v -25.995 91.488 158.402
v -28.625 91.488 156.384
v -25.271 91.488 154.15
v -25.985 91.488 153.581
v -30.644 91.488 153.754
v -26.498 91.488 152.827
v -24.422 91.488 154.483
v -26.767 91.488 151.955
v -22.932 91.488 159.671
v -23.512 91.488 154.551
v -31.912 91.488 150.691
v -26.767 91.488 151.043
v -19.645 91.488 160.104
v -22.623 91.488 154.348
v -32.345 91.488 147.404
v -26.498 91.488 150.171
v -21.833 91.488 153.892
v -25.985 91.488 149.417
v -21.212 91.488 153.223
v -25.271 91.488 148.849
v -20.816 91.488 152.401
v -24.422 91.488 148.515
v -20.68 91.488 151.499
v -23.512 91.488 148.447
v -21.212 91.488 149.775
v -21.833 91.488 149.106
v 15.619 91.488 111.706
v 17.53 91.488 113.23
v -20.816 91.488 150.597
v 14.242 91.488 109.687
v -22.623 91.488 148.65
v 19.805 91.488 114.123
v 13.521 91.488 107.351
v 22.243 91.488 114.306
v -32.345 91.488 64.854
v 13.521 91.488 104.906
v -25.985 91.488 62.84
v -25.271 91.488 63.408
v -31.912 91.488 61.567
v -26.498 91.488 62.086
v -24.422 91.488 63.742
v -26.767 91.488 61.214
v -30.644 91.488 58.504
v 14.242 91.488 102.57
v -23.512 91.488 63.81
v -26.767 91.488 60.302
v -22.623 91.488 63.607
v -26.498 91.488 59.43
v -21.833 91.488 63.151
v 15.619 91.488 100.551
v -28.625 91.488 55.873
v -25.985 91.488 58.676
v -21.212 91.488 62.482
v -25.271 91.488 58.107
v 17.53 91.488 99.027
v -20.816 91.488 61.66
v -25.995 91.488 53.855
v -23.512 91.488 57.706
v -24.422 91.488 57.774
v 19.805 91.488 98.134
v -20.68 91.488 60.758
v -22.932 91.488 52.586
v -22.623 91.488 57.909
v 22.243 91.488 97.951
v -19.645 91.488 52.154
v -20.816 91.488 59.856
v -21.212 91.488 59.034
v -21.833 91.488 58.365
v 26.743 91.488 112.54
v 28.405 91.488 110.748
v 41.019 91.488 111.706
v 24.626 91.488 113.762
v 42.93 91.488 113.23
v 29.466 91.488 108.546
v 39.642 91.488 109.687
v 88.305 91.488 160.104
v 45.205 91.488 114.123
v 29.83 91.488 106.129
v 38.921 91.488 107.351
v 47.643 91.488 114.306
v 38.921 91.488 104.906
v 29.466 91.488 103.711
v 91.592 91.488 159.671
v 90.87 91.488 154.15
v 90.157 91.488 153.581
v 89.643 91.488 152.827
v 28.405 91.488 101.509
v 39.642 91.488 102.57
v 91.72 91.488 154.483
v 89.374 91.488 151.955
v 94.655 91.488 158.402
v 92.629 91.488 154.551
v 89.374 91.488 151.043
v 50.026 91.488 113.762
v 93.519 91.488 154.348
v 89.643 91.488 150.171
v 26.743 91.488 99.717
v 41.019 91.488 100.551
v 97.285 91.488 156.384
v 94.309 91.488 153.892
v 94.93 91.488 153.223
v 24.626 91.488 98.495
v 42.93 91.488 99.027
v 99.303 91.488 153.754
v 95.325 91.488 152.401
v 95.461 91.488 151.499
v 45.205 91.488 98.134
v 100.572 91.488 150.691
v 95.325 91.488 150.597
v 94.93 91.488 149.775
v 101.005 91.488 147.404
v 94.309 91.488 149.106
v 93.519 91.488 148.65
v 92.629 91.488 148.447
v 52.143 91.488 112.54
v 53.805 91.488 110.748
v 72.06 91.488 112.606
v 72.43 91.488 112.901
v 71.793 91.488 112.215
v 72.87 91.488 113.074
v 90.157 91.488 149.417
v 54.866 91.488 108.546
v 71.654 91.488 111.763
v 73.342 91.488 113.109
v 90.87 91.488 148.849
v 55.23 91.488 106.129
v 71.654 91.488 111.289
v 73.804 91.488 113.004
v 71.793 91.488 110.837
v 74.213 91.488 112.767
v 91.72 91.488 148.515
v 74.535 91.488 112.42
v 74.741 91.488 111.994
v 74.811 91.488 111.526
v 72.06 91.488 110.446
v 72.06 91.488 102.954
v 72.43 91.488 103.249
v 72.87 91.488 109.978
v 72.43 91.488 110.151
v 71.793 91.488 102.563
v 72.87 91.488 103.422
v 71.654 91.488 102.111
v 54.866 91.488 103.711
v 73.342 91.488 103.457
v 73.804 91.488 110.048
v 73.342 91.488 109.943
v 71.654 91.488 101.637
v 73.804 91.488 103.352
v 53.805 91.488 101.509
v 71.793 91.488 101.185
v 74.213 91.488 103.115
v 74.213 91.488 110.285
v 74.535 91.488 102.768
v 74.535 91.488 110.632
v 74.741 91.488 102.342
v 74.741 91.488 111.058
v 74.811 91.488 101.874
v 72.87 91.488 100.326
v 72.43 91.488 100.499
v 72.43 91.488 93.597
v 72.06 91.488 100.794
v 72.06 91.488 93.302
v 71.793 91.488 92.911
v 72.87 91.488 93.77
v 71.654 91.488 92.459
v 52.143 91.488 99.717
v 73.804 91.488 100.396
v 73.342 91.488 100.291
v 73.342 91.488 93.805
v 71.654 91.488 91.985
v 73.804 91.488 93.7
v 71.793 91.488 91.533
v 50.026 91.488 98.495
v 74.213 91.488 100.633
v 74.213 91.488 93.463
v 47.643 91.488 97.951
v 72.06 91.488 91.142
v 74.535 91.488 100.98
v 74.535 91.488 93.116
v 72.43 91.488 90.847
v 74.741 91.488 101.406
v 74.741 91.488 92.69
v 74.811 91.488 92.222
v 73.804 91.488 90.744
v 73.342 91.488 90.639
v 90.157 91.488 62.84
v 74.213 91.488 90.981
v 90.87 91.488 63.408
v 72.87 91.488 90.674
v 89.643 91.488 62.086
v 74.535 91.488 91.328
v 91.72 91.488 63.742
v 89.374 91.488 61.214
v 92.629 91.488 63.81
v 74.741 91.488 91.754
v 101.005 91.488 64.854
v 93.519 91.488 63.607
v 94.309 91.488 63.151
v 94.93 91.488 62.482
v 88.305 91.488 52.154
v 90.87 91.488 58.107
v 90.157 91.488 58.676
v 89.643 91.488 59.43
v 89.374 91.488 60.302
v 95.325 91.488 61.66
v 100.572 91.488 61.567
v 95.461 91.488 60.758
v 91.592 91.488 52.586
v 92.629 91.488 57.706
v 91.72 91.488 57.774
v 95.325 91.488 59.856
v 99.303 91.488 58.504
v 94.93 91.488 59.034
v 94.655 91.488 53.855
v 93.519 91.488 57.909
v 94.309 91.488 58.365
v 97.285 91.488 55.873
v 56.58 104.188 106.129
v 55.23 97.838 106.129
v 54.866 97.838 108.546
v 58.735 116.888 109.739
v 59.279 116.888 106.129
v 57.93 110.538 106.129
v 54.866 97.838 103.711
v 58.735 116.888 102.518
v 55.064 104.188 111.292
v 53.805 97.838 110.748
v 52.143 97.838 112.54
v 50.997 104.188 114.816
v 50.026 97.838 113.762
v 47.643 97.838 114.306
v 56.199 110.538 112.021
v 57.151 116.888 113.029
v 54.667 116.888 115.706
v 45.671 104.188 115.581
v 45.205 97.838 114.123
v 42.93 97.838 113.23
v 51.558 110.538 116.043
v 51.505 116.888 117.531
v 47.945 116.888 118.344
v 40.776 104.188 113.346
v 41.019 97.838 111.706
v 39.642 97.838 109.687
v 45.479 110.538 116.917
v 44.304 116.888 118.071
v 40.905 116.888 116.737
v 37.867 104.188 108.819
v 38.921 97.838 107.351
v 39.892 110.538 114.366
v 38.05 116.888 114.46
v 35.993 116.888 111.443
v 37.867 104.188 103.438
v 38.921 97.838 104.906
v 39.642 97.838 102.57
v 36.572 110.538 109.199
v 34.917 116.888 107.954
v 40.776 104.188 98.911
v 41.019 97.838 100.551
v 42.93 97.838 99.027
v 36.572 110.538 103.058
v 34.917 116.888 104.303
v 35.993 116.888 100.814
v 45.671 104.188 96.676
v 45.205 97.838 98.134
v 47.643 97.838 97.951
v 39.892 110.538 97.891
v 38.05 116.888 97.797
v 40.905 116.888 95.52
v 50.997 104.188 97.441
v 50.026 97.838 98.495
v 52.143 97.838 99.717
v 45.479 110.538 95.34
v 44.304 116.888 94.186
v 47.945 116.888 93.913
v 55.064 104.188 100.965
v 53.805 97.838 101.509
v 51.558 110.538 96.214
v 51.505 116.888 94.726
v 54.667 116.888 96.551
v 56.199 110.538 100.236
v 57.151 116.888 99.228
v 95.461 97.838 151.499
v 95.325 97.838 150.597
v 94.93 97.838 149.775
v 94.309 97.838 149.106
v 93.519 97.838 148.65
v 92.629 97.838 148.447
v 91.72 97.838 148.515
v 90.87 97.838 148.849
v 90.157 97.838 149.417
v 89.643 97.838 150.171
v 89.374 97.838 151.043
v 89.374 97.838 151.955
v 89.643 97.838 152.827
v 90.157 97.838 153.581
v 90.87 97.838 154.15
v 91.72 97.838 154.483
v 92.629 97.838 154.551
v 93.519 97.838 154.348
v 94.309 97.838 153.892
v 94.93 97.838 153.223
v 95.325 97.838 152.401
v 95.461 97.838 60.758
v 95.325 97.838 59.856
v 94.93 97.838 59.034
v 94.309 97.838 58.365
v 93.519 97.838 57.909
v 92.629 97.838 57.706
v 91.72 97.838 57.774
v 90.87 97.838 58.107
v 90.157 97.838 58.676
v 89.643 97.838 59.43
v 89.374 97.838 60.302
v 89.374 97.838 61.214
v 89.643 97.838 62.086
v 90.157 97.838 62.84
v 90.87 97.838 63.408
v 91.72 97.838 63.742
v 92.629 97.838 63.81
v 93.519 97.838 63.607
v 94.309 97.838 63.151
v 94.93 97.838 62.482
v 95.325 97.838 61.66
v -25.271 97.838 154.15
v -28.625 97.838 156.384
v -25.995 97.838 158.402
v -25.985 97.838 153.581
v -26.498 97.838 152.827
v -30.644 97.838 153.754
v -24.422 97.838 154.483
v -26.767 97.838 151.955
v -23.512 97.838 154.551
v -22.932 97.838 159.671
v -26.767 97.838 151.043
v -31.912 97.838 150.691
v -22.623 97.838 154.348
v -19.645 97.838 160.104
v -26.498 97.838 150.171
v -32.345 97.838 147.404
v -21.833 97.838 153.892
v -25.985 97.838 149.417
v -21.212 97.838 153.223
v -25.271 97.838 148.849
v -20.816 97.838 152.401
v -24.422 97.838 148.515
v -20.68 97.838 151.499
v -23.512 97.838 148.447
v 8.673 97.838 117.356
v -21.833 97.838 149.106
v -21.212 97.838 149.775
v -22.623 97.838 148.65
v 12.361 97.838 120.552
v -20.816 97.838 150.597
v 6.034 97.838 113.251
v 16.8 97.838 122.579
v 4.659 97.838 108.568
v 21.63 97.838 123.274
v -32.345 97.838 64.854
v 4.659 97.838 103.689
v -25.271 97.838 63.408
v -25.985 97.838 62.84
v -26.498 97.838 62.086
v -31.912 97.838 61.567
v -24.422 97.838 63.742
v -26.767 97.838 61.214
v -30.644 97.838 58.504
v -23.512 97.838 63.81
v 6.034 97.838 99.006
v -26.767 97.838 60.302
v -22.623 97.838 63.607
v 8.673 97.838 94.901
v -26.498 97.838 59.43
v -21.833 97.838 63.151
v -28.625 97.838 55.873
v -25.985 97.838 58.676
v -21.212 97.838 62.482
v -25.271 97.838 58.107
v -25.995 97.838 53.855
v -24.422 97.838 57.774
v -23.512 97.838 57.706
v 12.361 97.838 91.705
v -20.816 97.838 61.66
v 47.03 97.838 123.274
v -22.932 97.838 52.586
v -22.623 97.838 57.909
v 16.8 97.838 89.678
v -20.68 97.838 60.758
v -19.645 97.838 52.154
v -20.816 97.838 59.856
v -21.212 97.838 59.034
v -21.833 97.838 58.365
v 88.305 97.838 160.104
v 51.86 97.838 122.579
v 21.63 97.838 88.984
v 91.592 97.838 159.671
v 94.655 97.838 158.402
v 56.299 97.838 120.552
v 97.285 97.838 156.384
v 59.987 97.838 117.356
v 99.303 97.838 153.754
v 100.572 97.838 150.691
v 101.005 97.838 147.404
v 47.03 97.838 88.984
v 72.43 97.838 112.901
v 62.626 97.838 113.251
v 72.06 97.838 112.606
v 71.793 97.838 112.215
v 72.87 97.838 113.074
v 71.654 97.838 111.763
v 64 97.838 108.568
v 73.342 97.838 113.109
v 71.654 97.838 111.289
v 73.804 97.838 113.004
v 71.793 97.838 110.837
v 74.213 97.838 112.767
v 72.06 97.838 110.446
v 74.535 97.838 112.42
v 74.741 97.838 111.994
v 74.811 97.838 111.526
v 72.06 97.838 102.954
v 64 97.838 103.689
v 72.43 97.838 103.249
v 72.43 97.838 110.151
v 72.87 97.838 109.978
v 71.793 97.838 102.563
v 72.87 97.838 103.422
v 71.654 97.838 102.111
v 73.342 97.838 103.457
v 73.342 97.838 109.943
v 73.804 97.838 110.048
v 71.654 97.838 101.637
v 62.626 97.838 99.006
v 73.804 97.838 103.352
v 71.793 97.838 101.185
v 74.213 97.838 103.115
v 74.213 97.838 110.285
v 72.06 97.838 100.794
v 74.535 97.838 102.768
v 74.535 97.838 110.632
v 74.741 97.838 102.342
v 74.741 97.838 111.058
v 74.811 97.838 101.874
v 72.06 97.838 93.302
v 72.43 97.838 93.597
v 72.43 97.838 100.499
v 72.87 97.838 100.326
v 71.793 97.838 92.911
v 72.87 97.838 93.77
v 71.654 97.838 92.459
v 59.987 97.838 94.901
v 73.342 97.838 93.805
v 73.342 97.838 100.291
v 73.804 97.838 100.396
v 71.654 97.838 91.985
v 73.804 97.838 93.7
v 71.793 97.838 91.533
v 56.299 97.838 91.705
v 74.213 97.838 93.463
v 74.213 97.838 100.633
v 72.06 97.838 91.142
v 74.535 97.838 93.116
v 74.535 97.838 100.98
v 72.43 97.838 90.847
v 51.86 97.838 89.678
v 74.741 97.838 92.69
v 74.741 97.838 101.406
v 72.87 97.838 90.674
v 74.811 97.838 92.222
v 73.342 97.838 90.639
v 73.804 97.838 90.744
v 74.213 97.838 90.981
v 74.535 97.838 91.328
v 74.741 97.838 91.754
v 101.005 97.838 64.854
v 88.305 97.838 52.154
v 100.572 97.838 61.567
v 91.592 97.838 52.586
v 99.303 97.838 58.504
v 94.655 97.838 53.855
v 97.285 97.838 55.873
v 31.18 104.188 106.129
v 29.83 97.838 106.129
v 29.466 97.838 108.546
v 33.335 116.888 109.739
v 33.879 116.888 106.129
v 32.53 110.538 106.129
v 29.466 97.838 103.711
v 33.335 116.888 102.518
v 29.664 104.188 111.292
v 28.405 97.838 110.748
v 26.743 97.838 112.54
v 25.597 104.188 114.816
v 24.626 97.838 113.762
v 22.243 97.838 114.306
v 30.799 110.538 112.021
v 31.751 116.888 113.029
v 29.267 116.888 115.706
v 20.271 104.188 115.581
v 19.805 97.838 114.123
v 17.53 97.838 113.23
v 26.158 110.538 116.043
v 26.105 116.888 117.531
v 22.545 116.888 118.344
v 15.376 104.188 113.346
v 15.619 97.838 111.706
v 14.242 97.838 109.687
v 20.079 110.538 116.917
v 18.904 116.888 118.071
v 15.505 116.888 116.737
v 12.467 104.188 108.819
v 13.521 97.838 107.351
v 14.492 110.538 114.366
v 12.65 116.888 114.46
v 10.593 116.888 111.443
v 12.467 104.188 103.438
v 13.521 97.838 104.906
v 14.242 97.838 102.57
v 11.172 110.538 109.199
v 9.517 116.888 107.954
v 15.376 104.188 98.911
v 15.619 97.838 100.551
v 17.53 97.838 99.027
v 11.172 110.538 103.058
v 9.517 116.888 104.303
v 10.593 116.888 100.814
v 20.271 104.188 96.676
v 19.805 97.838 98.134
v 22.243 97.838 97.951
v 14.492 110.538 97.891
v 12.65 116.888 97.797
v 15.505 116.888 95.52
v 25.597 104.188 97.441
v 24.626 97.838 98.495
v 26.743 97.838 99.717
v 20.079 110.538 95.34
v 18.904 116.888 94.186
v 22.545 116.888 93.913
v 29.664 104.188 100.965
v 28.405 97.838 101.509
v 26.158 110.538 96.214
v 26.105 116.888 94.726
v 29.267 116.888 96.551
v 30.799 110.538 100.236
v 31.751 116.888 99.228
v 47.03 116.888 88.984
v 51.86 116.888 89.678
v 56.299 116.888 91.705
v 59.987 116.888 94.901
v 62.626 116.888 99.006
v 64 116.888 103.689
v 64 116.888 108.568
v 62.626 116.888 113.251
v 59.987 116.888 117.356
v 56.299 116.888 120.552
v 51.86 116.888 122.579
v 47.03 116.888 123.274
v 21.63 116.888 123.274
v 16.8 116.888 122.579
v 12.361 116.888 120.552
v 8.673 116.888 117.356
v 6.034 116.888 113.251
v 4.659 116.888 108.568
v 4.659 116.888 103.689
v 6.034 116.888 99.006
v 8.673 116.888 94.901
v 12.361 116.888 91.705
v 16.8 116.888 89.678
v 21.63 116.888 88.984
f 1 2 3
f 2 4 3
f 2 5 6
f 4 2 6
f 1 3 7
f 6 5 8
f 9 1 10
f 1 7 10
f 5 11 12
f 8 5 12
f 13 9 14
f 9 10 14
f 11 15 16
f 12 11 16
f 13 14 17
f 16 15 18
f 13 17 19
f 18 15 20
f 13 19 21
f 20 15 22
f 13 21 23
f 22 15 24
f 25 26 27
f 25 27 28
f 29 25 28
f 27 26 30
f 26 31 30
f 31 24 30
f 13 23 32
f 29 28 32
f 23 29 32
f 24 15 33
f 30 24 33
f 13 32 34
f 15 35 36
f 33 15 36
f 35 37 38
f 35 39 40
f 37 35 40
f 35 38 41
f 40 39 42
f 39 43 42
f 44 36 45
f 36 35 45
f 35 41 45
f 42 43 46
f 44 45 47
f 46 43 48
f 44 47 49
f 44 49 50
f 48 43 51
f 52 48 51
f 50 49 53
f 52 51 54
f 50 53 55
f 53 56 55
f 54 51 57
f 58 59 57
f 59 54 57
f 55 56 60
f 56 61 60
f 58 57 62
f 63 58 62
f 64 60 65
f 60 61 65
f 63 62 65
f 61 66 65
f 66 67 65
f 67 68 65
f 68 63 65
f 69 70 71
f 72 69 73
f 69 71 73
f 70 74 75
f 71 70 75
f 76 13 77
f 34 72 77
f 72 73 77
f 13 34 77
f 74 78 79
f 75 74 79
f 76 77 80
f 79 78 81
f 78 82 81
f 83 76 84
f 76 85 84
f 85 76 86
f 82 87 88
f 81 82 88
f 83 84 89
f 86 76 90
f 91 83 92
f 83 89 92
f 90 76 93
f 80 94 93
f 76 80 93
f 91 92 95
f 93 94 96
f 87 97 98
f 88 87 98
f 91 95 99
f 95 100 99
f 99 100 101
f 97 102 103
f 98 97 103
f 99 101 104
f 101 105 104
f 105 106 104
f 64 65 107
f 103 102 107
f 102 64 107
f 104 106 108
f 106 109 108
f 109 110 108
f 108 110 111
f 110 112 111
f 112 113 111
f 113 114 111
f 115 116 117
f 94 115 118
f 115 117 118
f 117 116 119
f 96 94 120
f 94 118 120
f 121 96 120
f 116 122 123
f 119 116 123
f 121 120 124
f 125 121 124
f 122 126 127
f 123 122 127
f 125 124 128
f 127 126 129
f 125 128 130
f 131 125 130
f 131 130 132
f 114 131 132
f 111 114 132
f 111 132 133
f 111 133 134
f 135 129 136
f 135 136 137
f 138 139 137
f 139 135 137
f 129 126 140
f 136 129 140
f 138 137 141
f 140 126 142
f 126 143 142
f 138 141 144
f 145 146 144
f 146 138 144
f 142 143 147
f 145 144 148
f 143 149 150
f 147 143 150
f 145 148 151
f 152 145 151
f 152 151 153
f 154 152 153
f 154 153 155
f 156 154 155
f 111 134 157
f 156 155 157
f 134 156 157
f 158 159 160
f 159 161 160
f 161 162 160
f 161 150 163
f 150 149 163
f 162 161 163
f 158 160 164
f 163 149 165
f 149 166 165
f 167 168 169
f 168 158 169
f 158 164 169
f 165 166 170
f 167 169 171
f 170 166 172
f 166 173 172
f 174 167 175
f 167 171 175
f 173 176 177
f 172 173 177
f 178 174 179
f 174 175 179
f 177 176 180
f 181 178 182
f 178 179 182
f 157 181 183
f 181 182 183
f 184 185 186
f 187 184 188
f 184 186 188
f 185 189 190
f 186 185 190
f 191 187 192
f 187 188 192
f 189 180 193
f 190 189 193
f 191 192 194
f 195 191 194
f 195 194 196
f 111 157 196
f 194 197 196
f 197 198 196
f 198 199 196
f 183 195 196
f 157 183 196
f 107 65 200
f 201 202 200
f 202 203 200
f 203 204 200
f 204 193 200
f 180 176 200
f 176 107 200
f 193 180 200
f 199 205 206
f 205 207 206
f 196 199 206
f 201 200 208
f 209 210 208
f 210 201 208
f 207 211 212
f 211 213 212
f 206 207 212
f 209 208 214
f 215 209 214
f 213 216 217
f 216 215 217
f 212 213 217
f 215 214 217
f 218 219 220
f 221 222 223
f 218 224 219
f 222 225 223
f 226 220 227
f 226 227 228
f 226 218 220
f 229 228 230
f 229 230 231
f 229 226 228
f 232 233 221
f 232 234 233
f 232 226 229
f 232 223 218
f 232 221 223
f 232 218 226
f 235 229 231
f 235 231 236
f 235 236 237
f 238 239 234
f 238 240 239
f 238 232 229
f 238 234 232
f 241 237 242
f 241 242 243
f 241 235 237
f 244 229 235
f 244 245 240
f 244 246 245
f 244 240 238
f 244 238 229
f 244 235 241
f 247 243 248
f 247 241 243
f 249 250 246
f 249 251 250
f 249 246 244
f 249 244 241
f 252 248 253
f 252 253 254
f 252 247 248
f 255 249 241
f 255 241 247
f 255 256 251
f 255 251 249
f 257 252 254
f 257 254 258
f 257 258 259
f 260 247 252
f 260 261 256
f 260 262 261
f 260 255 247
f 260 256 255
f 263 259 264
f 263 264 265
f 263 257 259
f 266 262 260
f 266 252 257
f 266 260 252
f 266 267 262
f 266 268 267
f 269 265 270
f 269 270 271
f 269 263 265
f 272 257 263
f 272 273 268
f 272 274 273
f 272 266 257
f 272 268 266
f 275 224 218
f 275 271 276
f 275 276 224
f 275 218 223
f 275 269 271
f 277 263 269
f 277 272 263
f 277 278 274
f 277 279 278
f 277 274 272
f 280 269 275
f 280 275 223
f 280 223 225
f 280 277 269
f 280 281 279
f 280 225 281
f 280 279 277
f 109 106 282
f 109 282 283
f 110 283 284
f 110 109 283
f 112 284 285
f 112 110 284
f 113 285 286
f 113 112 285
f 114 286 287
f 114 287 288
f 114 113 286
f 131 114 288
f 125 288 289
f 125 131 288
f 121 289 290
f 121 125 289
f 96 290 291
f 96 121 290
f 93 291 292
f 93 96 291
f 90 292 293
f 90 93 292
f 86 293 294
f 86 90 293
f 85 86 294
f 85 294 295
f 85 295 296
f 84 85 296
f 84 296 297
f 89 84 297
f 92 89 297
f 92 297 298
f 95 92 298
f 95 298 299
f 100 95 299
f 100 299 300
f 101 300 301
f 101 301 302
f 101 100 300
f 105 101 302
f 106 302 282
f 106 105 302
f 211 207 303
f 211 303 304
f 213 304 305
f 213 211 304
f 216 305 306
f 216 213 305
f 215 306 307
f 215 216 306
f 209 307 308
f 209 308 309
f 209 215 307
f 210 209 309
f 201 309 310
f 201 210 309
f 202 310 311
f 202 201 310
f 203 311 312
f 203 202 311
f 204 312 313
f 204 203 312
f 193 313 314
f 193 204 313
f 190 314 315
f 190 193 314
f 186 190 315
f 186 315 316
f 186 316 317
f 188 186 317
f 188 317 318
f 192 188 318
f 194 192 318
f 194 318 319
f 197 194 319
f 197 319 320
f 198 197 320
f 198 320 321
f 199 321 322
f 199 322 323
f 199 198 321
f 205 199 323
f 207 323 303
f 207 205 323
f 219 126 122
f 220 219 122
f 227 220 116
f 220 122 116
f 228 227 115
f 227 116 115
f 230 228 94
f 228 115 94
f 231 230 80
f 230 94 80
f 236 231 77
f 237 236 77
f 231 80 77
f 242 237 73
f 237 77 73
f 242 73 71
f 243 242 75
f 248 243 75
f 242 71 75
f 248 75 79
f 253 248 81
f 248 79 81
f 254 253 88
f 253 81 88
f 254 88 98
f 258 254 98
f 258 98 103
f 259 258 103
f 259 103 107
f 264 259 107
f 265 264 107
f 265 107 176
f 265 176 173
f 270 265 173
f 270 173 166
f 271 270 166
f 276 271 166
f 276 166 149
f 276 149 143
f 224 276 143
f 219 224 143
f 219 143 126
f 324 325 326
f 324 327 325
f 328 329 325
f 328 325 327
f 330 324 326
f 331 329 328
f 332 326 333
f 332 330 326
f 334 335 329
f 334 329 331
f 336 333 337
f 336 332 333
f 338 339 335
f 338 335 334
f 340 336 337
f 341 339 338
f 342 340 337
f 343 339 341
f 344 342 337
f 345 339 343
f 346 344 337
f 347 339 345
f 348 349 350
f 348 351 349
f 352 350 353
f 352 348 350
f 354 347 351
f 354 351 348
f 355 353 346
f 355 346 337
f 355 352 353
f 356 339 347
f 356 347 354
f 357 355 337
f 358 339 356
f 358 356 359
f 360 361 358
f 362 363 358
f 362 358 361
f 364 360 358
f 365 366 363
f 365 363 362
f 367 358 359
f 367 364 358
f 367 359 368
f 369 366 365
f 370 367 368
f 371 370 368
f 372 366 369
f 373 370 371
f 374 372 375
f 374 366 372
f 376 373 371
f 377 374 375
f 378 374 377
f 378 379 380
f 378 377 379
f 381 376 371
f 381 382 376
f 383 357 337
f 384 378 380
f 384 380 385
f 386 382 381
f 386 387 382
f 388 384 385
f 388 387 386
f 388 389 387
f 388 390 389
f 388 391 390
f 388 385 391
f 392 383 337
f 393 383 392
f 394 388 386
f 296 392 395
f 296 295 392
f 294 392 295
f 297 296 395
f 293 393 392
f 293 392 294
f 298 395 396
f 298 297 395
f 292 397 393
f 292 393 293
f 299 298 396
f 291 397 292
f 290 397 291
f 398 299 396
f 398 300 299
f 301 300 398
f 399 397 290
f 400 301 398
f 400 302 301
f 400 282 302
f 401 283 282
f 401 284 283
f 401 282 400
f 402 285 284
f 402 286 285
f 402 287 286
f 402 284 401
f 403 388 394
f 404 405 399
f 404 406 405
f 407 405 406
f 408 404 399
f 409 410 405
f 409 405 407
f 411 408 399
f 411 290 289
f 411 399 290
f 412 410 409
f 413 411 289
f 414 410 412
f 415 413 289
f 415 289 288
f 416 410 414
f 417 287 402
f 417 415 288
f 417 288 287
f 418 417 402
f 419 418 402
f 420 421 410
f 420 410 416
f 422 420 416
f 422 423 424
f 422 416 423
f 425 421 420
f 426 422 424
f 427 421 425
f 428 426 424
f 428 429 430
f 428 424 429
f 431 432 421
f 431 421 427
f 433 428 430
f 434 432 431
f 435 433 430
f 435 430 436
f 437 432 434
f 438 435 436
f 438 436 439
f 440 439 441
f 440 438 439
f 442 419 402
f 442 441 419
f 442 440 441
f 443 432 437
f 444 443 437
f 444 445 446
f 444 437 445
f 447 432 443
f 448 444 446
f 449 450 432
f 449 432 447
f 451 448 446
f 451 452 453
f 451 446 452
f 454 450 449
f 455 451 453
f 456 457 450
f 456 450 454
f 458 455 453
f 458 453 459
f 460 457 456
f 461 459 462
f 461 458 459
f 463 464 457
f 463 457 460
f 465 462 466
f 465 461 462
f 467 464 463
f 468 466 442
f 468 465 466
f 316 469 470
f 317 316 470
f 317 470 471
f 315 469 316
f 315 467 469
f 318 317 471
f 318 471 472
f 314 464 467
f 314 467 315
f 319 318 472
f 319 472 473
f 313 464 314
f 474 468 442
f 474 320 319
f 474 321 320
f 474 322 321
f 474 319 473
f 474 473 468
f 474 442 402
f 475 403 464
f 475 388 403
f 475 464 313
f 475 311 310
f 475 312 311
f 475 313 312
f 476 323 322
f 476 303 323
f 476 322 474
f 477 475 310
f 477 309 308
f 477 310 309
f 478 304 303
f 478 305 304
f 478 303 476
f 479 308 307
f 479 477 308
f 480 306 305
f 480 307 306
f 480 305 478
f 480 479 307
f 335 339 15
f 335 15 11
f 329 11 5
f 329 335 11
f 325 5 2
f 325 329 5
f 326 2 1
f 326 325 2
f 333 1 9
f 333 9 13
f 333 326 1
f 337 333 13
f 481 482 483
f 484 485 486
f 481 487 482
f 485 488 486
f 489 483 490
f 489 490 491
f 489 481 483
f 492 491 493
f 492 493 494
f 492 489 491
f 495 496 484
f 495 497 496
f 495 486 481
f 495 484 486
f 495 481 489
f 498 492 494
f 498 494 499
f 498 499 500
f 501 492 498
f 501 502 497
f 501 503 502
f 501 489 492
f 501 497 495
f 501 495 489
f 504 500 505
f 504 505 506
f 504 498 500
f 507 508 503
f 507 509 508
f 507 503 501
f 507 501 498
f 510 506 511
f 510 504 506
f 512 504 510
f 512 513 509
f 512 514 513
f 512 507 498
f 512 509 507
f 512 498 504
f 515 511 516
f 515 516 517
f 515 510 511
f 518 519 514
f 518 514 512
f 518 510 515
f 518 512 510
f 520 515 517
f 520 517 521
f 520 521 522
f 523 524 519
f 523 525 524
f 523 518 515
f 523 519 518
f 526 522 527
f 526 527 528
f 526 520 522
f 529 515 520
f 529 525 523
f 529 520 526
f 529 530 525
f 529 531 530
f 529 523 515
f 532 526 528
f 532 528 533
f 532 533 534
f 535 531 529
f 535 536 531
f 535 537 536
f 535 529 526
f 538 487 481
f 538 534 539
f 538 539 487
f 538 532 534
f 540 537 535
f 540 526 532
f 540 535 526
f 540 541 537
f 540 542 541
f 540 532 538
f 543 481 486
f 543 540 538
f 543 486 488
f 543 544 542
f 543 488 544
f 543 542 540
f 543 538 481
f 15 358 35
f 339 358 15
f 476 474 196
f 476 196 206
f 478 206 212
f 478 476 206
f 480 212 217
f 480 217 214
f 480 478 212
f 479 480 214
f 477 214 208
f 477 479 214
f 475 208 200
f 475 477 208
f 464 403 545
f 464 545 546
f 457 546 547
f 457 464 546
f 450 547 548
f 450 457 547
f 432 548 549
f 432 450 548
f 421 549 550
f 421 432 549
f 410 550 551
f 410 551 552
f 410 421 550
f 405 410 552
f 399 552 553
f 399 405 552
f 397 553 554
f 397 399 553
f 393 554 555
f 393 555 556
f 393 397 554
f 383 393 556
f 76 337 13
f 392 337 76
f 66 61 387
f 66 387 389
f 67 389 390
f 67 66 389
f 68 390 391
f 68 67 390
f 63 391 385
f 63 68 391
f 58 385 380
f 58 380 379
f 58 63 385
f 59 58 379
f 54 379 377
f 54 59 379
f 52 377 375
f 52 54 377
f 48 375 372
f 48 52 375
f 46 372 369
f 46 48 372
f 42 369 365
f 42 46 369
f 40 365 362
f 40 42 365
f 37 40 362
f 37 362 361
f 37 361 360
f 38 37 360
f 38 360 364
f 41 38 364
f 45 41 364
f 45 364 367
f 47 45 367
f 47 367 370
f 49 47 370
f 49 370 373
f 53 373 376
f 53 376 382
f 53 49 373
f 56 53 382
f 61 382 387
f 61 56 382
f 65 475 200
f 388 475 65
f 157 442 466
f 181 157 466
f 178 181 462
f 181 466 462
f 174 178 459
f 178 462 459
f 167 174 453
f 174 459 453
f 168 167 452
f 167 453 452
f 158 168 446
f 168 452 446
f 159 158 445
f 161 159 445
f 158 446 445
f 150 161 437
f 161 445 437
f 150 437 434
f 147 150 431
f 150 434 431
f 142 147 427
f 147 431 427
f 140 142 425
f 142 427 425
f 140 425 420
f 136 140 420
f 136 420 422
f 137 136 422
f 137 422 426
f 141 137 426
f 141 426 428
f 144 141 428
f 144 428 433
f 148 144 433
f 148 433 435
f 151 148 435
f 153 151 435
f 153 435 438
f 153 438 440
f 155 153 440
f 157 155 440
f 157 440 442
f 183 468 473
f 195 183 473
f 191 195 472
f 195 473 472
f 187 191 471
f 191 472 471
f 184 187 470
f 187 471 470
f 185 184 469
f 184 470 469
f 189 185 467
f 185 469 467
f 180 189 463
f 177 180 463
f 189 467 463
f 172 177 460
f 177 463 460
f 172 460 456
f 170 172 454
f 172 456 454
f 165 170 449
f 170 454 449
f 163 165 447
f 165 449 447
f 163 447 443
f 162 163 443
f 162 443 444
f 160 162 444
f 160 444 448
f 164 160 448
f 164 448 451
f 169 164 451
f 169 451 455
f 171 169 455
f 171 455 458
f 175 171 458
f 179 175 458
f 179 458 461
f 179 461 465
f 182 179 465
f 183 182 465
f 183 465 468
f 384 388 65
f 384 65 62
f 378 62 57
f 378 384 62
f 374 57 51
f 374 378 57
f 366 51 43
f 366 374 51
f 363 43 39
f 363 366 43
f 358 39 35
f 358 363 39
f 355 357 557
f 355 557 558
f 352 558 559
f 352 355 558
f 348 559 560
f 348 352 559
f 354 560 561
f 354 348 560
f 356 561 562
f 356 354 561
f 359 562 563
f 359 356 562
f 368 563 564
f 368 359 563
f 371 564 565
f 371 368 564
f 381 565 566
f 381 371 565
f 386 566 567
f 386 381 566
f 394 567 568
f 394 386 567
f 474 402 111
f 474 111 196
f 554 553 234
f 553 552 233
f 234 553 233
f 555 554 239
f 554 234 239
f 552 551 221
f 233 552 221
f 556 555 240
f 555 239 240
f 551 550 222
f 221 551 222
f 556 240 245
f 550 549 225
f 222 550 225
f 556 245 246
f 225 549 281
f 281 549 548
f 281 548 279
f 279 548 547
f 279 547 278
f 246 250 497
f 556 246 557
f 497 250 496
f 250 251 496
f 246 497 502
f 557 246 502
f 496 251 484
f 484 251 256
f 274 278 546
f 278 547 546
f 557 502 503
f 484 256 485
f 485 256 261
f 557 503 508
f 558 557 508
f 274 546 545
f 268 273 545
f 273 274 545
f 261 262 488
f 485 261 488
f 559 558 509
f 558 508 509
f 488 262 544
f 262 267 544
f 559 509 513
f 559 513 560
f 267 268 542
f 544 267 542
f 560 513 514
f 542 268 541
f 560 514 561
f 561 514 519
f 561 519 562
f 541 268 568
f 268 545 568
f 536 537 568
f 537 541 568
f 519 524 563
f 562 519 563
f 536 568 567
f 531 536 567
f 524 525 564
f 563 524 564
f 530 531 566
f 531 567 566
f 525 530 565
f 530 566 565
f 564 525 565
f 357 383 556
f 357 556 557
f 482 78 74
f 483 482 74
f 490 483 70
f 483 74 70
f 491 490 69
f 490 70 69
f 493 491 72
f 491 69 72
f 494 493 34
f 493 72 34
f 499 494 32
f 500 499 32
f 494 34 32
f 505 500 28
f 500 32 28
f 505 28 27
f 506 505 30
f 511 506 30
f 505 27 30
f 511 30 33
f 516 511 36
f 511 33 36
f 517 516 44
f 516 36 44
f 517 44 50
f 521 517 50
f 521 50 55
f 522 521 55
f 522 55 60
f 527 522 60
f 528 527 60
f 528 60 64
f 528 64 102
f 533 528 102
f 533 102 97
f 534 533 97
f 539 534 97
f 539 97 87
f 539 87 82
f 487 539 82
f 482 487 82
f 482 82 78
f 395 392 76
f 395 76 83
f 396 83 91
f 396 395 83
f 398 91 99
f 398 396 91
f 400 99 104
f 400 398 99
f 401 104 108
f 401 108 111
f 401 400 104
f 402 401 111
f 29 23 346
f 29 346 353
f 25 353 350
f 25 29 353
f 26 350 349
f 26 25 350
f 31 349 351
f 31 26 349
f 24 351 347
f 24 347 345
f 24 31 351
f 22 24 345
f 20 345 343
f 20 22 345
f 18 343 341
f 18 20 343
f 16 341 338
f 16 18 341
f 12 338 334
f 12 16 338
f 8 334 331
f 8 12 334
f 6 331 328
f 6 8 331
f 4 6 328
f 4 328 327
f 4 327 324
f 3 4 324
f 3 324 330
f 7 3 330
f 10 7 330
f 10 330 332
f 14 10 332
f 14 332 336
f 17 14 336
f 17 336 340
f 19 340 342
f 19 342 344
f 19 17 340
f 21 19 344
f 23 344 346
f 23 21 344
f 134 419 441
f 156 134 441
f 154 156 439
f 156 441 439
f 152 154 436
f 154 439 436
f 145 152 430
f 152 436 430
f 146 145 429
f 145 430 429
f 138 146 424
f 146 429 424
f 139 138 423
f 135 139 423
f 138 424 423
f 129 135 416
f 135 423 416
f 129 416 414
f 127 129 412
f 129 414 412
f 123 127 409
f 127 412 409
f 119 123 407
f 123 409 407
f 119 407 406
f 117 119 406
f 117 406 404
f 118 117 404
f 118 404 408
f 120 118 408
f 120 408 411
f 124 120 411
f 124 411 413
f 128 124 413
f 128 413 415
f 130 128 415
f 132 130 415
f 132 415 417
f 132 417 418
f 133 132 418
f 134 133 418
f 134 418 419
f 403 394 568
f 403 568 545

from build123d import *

# Parameters (mm, degrees)
SKETCH1_R           = 3.0607
BOSS_EXTRUDE1_DEPTH = 6.35
SKETCH2_R           = 8.20039
CUT_EXTRUDE1_DEPTH  = 7.35
BOSS_EXTRUDE2_DEPTH = 19.05
SKETCH4_R           = 8.20039
CUT_EXTRUDE2_DEPTH  = 19.05
CUT_EXTRUDE2_TAPER  = -12
SKETCH5_R           = 1.5875
CUT_EXTRUDE3_DEPTH  = 7.35
BOSS_EXTRUDE3_DEPTH = 6.35


with BuildPart() as part:
    # Sketch1 → Boss-Extrude1 (new body)
    with BuildSketch(Plane(origin=(0, 91.487983019, 0), x_dir=(1, 0, 0), z_dir=(0, 1, 0))):
        with BuildLine():
            Line((-19.645108088, -156.928503968), (88.304891912, -156.928503968))
            ThreePointArc((88.304891912, -156.928503968), (95.040084003, -154.138696059), (97.829891912, -147.403503968))
            Line((97.829891912, -147.403503968), (97.829891912, -64.853503968))
            ThreePointArc((97.829891912, -64.853503968), (95.040084003, -58.118311877), (88.304891912, -55.328503968))
            Line((88.304891912, -55.328503968), (-19.645108088, -55.328503968))
            ThreePointArc((-19.645108088, -55.328503968), (-26.380300179, -58.118311877), (-29.170108088, -64.853503968))
            Line((-29.170108088, -64.853503968), (-29.170108088, -147.403503968))
            ThreePointArc((-29.170108088, -147.403503968), (-26.380300179, -154.138696059), (-19.645108088, -156.928503968))
        make_face()
        with Locations((-23.740858088, -151.499253968)):
            Circle(SKETCH1_R, mode=Mode.SUBTRACT)
        with Locations((-23.740858088, -60.757753968)):
            Circle(SKETCH1_R, mode=Mode.SUBTRACT)
        with Locations((92.400641912, -60.757753968)):
            Circle(SKETCH1_R, mode=Mode.SUBTRACT)
        with Locations((92.400641912, -151.499253968)):
            Circle(SKETCH1_R, mode=Mode.SUBTRACT)
    extrude(amount=BOSS_EXTRUDE1_DEPTH)

    # Sketch2 → Cut-Extrude1 (cut, through all)
    with BuildSketch(Plane.XZ.offset(-91.487983019)):
        with Locations((47.029891912, 106.128503968)):
            Circle(SKETCH2_R)
        with Locations((21.629891912, 106.128503968)):
            Circle(SKETCH2_R)
    extrude(amount=-CUT_EXTRUDE1_DEPTH, mode=Mode.SUBTRACT)

    # Sketch3 → Boss-Extrude2 (add)
    with BuildSketch(Plane(origin=(0, 97.837983019, 0), x_dir=(1, 0, 0), z_dir=(0, 1, 0))):
        with BuildLine():
            Line((21.629891912, -88.983503968), (47.029891912, -88.983503968))
            ThreePointArc((47.029891912, -88.983503968), (64.174891912, -106.128503968), (47.029891912, -123.273503968))
            Line((47.029891912, -123.273503968), (21.629891912, -123.273503968))
            ThreePointArc((21.629891912, -123.273503968), (4.484891912, -106.128503968), (21.629891912, -88.983503968))
        make_face()
    extrude(amount=BOSS_EXTRUDE2_DEPTH)

    # Sketch4 → Cut-Extrude2 (cut)
    with BuildSketch(Plane.XZ.offset(-97.837983019)):
        with Locations((21.629891912, 106.128503968)):
            Circle(SKETCH4_R)
        with Locations((47.029891912, 106.128503968)):
            Circle(SKETCH4_R)
    extrude(amount=-CUT_EXTRUDE2_DEPTH, taper=CUT_EXTRUDE2_TAPER, mode=Mode.SUBTRACT)

    # Sketch5 → Cut-Extrude3 (cut, through all)
    with BuildSketch(Plane(origin=(0, 97.837983019, 0), x_dir=(1, 0, 0), z_dir=(0, 1, 0))):
        with Locations((73.223641912, -111.526003968)):
            Circle(SKETCH5_R)
        with Locations((73.223641912, -101.874003968)):
            Circle(SKETCH5_R)
        with Locations((73.223641912, -92.222003968)):
            Circle(SKETCH5_R)
    extrude(amount=-CUT_EXTRUDE3_DEPTH, mode=Mode.SUBTRACT)

    # Sketch6 → Boss-Extrude3 (add)
    with BuildSketch(Plane(origin=(0, 97.837983019, 0), x_dir=(1, 0, 0), z_dir=(0, 1, 0))):
        with BuildLine():
            Line((-32.345108088, -64.853503968), (-32.345108088, -147.403503968))
            ThreePointArc((-32.345108088, -147.403503968), (-28.625364209, -156.383760089), (-19.645108088, -160.103503968))
            Line((-19.645108088, -160.103503968), (88.304891912, -160.103503968))
            ThreePointArc((88.304891912, -160.103503968), (97.285148033, -156.383760089), (101.004891912, -147.403503968))
            Line((101.004891912, -147.403503968), (101.004891912, -64.853503968))
            ThreePointArc((101.004891912, -64.853503968), (97.285148033, -55.873247847), (88.304891912, -52.153503968))
            Line((88.304891912, -52.153503968), (-19.645108088, -52.153503968))
            ThreePointArc((-19.645108088, -52.153503968), (-28.625364209, -55.873247847), (-32.345108088, -64.853503968))
        make_face()
        with BuildLine():
            Line((-19.645108088, -156.928503968), (88.304891912, -156.928503968))
            ThreePointArc((88.304891912, -156.928503968), (95.040084003, -154.138696059), (97.829891912, -147.403503968))
            Line((97.829891912, -147.403503968), (97.829891912, -64.853503968))
            ThreePointArc((97.829891912, -64.853503968), (95.040084003, -58.118311877), (88.304891912, -55.328503968))
            Line((88.304891912, -55.328503968), (-19.645108088, -55.328503968))
            ThreePointArc((-19.645108088, -55.328503968), (-26.380300179, -58.118311877), (-29.170108088, -64.853503968))
            Line((-29.170108088, -64.853503968), (-29.170108088, -147.403503968))
            ThreePointArc((-29.170108088, -147.403503968), (-26.380300179, -154.138696059), (-19.645108088, -156.928503968))
        make_face(mode=Mode.SUBTRACT)
    extrude(amount=-BOSS_EXTRUDE3_DEPTH)


solid = part.part
